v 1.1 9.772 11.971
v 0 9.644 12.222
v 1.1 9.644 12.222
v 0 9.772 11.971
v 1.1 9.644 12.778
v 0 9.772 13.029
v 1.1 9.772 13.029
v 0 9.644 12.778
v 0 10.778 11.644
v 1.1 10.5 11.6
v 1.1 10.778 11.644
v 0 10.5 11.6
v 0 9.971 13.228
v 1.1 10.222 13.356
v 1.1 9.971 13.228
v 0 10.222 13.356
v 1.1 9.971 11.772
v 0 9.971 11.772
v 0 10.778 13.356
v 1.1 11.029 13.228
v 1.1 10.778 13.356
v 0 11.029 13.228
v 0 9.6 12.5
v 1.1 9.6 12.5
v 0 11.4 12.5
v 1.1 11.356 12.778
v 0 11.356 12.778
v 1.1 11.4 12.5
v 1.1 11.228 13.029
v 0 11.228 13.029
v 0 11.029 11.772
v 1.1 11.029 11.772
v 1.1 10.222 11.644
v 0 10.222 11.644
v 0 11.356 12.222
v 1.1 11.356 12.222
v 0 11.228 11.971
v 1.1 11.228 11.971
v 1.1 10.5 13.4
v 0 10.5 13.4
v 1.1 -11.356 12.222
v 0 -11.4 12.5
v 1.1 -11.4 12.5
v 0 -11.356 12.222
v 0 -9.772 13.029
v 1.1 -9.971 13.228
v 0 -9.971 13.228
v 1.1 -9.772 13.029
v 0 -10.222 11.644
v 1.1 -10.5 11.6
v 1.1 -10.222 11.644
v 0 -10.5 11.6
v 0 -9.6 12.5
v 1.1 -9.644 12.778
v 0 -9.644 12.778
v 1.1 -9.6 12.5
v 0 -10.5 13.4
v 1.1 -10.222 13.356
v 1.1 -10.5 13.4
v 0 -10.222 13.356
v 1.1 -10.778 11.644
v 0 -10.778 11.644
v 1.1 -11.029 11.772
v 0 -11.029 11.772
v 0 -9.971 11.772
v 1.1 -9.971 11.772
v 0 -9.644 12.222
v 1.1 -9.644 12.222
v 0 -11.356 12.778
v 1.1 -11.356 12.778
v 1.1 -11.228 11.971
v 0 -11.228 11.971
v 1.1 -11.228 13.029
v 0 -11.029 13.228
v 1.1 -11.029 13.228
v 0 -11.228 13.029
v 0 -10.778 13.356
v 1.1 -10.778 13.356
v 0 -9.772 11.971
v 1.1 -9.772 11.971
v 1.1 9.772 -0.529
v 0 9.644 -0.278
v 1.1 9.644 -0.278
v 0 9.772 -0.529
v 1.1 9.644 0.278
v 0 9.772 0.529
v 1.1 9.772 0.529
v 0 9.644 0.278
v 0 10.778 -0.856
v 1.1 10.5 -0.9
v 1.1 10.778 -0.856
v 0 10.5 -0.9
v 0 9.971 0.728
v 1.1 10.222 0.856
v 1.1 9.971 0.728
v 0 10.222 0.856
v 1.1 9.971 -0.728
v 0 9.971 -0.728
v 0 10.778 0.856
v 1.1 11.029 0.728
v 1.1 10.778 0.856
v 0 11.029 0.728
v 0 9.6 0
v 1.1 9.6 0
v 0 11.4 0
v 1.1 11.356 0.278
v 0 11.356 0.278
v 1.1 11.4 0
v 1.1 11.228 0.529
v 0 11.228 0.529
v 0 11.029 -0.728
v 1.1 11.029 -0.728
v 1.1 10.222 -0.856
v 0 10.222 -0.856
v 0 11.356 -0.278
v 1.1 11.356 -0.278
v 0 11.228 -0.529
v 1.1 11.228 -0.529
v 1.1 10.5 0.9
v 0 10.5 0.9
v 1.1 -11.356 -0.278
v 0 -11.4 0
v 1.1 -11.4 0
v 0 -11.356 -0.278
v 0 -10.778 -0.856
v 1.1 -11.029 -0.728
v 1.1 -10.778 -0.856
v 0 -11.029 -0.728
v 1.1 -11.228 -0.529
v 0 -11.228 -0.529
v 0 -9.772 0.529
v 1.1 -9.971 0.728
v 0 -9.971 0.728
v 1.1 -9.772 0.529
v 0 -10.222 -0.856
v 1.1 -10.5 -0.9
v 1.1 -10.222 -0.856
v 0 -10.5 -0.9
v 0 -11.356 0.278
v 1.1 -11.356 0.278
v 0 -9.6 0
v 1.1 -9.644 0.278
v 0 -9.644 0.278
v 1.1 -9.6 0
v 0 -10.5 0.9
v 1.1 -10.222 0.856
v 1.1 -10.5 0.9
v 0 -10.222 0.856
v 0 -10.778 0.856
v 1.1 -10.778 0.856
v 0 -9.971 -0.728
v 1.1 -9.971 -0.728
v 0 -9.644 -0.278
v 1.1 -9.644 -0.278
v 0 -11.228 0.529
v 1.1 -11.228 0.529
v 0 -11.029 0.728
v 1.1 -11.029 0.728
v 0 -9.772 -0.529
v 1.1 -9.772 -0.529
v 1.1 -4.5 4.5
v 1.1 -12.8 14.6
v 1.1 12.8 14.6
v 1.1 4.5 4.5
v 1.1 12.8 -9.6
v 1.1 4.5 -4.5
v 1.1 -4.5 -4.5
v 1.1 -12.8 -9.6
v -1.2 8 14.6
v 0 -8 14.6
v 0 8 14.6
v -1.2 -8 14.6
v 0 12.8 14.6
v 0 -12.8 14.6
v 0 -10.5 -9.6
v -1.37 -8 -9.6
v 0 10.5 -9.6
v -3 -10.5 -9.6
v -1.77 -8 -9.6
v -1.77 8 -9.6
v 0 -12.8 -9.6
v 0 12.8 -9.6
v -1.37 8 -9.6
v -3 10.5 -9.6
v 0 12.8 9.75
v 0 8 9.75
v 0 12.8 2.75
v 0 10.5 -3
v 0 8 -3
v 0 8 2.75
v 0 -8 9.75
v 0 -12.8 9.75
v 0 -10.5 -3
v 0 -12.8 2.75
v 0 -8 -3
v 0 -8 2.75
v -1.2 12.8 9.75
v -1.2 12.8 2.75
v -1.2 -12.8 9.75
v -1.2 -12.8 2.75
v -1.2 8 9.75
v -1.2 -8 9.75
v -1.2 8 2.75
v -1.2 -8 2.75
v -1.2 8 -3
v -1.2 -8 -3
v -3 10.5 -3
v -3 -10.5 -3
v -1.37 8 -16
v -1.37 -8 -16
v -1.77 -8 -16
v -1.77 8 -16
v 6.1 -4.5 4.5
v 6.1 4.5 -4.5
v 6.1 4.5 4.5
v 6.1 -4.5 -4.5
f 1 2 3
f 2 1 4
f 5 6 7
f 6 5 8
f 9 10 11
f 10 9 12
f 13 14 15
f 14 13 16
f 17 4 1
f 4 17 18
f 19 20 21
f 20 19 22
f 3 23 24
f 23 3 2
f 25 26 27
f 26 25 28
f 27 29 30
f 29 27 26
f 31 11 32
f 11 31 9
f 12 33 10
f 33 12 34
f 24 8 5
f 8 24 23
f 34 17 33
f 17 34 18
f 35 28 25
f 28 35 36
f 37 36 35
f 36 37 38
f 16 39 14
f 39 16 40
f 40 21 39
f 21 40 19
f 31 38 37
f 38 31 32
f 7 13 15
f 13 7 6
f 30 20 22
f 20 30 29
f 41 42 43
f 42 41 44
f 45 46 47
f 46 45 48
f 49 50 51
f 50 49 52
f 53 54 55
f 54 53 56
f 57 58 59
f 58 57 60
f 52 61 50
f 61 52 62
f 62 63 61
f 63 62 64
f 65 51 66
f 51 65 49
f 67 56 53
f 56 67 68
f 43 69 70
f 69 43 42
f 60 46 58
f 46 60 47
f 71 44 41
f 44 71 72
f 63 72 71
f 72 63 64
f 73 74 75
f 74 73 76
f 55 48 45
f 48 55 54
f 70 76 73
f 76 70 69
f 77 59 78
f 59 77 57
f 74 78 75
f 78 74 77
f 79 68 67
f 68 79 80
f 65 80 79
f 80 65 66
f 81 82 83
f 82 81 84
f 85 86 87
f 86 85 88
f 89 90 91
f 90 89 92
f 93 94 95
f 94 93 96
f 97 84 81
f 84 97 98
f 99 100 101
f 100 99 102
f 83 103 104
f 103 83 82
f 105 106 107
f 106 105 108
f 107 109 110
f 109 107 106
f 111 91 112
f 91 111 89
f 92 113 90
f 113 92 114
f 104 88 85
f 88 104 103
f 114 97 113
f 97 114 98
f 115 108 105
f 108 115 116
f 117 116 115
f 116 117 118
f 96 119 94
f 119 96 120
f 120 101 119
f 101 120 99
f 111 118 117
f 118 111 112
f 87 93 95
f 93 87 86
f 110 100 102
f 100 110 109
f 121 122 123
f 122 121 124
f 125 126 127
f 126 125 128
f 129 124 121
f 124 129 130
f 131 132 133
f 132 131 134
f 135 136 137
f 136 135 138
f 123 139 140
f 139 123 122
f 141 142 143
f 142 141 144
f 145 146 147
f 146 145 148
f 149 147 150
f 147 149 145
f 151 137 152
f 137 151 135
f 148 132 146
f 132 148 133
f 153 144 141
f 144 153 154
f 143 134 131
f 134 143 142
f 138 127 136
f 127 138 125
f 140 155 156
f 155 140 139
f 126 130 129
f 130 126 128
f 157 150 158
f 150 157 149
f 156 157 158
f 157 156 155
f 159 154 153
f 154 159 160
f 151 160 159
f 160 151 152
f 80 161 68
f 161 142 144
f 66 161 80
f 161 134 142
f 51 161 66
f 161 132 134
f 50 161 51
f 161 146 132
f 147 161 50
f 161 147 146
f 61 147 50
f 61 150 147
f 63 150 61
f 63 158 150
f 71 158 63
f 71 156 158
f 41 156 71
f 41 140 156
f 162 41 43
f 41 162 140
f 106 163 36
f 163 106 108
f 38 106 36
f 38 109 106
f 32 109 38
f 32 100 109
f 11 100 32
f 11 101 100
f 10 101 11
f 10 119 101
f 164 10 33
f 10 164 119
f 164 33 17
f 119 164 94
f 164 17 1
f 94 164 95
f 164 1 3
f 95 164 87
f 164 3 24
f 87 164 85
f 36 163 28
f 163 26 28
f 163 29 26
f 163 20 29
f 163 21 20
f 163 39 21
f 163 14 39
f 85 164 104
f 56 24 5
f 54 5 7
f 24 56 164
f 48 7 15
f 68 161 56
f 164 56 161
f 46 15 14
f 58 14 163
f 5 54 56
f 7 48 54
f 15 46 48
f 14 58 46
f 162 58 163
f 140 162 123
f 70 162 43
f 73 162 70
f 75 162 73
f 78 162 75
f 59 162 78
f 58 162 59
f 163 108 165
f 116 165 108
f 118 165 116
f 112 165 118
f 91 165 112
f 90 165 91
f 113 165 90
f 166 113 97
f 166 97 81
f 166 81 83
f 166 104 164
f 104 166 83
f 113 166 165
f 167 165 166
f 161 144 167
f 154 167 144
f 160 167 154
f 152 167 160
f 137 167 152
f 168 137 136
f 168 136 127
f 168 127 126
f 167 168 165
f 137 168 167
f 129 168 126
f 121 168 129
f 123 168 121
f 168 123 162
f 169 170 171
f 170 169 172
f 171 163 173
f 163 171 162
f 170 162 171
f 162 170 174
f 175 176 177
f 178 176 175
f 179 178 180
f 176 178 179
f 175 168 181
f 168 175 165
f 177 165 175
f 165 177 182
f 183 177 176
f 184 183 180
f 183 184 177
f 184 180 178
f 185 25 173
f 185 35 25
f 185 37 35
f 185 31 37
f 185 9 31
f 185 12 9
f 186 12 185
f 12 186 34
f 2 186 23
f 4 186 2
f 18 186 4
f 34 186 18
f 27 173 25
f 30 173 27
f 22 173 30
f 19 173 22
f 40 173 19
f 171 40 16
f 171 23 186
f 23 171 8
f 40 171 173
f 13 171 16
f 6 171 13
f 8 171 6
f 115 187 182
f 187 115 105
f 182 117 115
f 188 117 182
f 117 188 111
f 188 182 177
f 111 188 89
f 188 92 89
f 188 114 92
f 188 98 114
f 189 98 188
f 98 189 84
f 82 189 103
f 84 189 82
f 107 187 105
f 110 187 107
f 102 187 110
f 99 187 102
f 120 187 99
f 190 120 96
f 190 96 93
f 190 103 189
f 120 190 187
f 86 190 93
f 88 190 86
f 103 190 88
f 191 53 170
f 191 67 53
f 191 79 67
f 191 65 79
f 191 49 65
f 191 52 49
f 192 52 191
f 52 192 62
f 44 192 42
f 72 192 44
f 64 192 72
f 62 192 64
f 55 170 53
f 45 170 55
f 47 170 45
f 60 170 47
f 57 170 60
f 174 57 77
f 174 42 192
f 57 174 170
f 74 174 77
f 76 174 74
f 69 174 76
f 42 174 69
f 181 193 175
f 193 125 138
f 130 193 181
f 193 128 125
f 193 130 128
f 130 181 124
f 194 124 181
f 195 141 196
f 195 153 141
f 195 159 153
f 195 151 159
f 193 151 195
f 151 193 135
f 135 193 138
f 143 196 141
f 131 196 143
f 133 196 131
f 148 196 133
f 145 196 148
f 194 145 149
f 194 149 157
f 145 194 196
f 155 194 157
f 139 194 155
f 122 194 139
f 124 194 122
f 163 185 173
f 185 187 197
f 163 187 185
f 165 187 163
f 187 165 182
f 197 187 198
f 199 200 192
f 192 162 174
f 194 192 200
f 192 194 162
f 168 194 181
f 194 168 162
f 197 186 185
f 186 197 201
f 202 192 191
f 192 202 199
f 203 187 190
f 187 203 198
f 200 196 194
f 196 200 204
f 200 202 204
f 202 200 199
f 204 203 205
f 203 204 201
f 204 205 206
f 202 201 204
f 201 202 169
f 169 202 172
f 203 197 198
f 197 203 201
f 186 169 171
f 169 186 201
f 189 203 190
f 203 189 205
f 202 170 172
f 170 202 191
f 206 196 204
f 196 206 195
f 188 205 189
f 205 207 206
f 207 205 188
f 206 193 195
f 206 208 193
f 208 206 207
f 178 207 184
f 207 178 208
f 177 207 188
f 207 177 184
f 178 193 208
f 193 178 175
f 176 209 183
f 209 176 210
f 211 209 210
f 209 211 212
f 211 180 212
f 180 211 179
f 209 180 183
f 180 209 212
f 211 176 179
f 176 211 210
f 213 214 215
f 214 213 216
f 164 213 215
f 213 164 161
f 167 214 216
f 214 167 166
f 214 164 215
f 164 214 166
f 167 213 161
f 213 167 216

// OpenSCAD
//  PiCam design
// written in OpenSCAD
//
// Written: 10/1/2017
//    Rev.: 0.01
//      By: Robert S. Rau
// Updated: 
//    Rev.: 
//      By: Robert S. Rau
// Changes: 
//
//
//
//
//  ToDo list
//
//
// Overall circle/sphere definition  development: set to 20, production: set to 120
//
$fn=20;

PCBThickness = 1.1;
CamSizeY = 25.6;
CamSizeZ = 24.2;
CamSensorHeight = 5.1;
CamLensOffsetZ = 2.5;
CamBotEleHeight=2.3-PCBThickness;  // expressed this way since it is the easiest way to measure
CamMountingHoleCCZ = 12.5;
CamMountingHoleCCY = 21;
CanConnectorZ = 6.6;

// mounting holes
module CamHoles() {
         translate([0,CamMountingHoleCCY/2.0,CamMountingHoleCCZ]) {
             rotate( a=90, v=[0,1,0]) { cylinder(d=1.8,h=PCBThickness*3,center=true); }
         }
         translate([0,-CamMountingHoleCCY/2.0,CamMountingHoleCCZ]) {
             rotate( a=90, v=[0,1,0]) { cylinder(d=1.8,h=PCBThickness*3,center=true); }
         }
         translate([0,CamMountingHoleCCY/2.0,0]) {
             rotate( a=90, v=[0,1,0]) { cylinder(d=1.8,h=PCBThickness*3,center=true); }
         }
         translate([0,-CamMountingHoleCCY/2.0,0]) {
             rotate( a=90, v=[0,1,0]) { cylinder(d=1.8,h=PCBThickness*3,center=true); }
         }
    
}



module CamPCB() {
    difference() {
    translate([PCBThickness/2.0,0,CamLensOffsetZ]) {
        cube([PCBThickness,CamSizeY,CamSizeZ], center=true);
    }
    CamHoles();
}
}




// bottom side electronics
module CamBotEle() {
     translate([-CamBotEleHeight/2.0,0,CamMountingHoleCCZ/2.0]) {
        cube([CamBotEleHeight,CamSizeY,7], center=true);
     }
     translate([-CamBotEleHeight/2.0,0,CamLensOffsetZ]) {
        cube([CamBotEleHeight,CamMountingHoleCCY-5,CamSizeZ], center=true);
     }  
    // connector 
     translate([-1.5,0,-CamSizeZ/2.0+CamLensOffsetZ+CanConnectorZ/2.0]) {
        cube([3,21,CanConnectorZ], center=true);
     }   
    // Flex 
     translate([-1.57,0,-CamSizeZ/2.0+CamLensOffsetZ-2.9]) {
        cube([0.4,16,7], center=true);
     }   
  }
    
    
    
    
    
    
// lens
  module CamLens() {
           translate([PCBThickness+2.5,0,0]) {
        cube([5,9,9], center=true);
     }
 }

module CamAll() {
    CamPCB();
    CamBotEle();
    CamLens();
}

CamAll();
